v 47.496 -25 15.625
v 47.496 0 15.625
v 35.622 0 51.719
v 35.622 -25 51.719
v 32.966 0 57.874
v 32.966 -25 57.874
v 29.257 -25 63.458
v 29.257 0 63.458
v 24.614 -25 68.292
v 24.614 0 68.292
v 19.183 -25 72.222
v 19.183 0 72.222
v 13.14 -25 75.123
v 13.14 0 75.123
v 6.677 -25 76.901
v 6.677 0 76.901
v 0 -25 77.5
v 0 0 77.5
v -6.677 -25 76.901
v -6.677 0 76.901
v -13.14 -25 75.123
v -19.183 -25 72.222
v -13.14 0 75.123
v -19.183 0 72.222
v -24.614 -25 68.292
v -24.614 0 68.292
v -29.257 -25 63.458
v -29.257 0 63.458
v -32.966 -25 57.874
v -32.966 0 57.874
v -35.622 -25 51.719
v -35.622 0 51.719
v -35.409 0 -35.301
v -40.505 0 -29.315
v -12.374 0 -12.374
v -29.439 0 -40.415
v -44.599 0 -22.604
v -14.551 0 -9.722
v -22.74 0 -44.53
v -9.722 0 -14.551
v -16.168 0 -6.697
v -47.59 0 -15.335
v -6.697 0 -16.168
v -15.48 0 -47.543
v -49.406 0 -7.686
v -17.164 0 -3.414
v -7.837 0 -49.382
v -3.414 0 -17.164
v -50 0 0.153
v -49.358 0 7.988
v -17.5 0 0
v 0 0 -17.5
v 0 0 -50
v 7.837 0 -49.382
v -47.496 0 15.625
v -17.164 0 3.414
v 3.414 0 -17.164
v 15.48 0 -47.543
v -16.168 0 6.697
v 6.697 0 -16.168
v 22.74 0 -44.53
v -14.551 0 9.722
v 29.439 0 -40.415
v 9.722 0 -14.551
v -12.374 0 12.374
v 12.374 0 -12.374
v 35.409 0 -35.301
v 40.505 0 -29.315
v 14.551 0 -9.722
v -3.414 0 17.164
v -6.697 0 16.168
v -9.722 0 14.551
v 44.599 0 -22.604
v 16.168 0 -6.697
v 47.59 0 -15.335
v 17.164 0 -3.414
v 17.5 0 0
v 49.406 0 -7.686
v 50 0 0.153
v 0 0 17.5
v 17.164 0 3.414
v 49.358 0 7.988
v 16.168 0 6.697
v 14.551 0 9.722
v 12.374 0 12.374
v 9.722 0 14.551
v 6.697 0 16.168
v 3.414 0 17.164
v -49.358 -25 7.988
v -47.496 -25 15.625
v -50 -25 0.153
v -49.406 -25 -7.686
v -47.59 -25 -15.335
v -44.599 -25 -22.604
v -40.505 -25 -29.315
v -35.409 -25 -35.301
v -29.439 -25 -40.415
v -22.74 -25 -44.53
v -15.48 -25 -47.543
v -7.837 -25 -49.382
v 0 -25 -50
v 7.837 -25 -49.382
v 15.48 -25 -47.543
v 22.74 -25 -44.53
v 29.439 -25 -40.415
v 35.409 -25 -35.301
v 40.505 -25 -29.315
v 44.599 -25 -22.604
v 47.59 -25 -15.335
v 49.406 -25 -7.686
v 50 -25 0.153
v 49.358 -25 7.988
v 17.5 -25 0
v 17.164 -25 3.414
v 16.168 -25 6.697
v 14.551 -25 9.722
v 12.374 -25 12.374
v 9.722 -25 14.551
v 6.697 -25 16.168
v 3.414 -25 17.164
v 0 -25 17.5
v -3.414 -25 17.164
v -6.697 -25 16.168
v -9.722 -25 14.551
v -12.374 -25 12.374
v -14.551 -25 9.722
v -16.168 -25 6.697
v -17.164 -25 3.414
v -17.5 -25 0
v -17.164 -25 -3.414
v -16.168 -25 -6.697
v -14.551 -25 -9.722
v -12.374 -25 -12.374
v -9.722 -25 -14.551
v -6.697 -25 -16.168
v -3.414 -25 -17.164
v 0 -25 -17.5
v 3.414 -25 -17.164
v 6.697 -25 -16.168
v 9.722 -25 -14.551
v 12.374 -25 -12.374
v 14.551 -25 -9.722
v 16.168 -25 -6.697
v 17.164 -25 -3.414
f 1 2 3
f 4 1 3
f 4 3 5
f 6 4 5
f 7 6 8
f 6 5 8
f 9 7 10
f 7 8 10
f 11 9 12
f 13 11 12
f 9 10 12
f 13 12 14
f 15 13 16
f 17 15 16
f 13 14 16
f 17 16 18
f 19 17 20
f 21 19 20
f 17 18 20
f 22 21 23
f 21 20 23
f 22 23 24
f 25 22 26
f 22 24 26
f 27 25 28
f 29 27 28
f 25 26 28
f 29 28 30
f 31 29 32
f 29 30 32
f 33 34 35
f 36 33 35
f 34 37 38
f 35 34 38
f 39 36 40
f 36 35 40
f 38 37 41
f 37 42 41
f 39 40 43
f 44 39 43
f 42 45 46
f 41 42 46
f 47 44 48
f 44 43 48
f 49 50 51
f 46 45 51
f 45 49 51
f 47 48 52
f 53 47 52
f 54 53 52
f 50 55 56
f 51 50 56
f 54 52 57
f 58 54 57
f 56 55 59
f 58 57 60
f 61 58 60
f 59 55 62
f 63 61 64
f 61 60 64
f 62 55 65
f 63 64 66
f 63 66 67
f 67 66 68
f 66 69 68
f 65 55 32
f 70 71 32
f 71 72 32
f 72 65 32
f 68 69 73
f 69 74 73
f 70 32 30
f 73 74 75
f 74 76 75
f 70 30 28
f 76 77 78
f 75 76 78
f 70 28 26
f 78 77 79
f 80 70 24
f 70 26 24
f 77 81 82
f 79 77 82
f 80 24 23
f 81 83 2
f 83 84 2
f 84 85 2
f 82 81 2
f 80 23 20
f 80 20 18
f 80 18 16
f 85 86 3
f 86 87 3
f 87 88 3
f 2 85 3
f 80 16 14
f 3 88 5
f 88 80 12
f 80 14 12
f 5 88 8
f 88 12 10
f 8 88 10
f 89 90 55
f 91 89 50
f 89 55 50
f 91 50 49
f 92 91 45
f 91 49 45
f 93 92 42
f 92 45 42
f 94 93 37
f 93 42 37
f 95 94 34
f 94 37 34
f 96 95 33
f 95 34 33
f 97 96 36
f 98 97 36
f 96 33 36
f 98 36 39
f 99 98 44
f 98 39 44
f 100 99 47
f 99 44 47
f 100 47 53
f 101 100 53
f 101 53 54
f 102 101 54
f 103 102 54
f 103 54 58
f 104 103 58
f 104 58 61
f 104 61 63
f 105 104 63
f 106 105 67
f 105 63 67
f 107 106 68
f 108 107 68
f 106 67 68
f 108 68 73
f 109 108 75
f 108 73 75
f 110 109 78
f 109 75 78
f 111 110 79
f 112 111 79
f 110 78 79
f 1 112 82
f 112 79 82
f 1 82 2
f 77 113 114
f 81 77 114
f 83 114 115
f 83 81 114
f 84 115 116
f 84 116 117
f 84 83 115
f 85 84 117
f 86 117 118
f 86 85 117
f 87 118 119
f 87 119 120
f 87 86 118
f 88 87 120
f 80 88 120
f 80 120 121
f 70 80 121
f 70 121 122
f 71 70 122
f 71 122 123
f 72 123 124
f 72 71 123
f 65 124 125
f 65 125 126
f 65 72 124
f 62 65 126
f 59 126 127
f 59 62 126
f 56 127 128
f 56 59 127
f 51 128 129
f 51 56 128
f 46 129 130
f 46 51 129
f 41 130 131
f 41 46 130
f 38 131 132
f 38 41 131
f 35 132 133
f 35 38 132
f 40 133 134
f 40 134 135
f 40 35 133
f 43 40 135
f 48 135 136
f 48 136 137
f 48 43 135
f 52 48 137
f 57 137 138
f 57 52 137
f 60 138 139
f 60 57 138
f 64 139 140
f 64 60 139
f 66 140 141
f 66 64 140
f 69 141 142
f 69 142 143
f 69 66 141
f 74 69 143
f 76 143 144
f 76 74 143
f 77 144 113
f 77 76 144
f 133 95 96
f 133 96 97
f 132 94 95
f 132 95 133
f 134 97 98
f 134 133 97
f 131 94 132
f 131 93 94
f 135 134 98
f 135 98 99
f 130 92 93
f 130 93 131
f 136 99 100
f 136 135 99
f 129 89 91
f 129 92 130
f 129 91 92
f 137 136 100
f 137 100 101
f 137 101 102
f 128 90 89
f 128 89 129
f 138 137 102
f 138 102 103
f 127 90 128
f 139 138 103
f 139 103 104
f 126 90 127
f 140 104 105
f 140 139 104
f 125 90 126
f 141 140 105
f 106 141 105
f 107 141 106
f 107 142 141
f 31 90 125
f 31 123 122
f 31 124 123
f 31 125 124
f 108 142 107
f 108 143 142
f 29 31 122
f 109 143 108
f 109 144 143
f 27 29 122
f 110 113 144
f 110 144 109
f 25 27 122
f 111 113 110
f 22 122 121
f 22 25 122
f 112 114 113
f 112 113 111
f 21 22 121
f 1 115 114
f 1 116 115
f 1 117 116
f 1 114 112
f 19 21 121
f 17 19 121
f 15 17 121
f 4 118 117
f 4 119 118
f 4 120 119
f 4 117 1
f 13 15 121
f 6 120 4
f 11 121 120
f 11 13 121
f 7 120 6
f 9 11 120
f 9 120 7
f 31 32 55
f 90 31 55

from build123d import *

# Parameters (mm, degrees)
F0_R     = 17.5
F1_DEPTH = 25


with BuildPart() as f1:
    # F0 (on Front) → F1 (new body)
    with BuildSketch(Plane.XZ):
        with BuildLine():
            Line((47.495888, 15.625), (35.621916, 51.71875))
            ThreePointArc((35.621916, 51.71875), (0, 77.5), (-35.621916, 51.71875))
            Line((-35.621916, 51.71875), (-47.495888, 15.625))
            ThreePointArc((-47.495888, 15.625), (0, -50), (47.495888, 15.625))
        make_face()
        Circle(F0_R, mode=Mode.SUBTRACT)
    extrude(amount=F1_DEPTH)


solid = f1.part
